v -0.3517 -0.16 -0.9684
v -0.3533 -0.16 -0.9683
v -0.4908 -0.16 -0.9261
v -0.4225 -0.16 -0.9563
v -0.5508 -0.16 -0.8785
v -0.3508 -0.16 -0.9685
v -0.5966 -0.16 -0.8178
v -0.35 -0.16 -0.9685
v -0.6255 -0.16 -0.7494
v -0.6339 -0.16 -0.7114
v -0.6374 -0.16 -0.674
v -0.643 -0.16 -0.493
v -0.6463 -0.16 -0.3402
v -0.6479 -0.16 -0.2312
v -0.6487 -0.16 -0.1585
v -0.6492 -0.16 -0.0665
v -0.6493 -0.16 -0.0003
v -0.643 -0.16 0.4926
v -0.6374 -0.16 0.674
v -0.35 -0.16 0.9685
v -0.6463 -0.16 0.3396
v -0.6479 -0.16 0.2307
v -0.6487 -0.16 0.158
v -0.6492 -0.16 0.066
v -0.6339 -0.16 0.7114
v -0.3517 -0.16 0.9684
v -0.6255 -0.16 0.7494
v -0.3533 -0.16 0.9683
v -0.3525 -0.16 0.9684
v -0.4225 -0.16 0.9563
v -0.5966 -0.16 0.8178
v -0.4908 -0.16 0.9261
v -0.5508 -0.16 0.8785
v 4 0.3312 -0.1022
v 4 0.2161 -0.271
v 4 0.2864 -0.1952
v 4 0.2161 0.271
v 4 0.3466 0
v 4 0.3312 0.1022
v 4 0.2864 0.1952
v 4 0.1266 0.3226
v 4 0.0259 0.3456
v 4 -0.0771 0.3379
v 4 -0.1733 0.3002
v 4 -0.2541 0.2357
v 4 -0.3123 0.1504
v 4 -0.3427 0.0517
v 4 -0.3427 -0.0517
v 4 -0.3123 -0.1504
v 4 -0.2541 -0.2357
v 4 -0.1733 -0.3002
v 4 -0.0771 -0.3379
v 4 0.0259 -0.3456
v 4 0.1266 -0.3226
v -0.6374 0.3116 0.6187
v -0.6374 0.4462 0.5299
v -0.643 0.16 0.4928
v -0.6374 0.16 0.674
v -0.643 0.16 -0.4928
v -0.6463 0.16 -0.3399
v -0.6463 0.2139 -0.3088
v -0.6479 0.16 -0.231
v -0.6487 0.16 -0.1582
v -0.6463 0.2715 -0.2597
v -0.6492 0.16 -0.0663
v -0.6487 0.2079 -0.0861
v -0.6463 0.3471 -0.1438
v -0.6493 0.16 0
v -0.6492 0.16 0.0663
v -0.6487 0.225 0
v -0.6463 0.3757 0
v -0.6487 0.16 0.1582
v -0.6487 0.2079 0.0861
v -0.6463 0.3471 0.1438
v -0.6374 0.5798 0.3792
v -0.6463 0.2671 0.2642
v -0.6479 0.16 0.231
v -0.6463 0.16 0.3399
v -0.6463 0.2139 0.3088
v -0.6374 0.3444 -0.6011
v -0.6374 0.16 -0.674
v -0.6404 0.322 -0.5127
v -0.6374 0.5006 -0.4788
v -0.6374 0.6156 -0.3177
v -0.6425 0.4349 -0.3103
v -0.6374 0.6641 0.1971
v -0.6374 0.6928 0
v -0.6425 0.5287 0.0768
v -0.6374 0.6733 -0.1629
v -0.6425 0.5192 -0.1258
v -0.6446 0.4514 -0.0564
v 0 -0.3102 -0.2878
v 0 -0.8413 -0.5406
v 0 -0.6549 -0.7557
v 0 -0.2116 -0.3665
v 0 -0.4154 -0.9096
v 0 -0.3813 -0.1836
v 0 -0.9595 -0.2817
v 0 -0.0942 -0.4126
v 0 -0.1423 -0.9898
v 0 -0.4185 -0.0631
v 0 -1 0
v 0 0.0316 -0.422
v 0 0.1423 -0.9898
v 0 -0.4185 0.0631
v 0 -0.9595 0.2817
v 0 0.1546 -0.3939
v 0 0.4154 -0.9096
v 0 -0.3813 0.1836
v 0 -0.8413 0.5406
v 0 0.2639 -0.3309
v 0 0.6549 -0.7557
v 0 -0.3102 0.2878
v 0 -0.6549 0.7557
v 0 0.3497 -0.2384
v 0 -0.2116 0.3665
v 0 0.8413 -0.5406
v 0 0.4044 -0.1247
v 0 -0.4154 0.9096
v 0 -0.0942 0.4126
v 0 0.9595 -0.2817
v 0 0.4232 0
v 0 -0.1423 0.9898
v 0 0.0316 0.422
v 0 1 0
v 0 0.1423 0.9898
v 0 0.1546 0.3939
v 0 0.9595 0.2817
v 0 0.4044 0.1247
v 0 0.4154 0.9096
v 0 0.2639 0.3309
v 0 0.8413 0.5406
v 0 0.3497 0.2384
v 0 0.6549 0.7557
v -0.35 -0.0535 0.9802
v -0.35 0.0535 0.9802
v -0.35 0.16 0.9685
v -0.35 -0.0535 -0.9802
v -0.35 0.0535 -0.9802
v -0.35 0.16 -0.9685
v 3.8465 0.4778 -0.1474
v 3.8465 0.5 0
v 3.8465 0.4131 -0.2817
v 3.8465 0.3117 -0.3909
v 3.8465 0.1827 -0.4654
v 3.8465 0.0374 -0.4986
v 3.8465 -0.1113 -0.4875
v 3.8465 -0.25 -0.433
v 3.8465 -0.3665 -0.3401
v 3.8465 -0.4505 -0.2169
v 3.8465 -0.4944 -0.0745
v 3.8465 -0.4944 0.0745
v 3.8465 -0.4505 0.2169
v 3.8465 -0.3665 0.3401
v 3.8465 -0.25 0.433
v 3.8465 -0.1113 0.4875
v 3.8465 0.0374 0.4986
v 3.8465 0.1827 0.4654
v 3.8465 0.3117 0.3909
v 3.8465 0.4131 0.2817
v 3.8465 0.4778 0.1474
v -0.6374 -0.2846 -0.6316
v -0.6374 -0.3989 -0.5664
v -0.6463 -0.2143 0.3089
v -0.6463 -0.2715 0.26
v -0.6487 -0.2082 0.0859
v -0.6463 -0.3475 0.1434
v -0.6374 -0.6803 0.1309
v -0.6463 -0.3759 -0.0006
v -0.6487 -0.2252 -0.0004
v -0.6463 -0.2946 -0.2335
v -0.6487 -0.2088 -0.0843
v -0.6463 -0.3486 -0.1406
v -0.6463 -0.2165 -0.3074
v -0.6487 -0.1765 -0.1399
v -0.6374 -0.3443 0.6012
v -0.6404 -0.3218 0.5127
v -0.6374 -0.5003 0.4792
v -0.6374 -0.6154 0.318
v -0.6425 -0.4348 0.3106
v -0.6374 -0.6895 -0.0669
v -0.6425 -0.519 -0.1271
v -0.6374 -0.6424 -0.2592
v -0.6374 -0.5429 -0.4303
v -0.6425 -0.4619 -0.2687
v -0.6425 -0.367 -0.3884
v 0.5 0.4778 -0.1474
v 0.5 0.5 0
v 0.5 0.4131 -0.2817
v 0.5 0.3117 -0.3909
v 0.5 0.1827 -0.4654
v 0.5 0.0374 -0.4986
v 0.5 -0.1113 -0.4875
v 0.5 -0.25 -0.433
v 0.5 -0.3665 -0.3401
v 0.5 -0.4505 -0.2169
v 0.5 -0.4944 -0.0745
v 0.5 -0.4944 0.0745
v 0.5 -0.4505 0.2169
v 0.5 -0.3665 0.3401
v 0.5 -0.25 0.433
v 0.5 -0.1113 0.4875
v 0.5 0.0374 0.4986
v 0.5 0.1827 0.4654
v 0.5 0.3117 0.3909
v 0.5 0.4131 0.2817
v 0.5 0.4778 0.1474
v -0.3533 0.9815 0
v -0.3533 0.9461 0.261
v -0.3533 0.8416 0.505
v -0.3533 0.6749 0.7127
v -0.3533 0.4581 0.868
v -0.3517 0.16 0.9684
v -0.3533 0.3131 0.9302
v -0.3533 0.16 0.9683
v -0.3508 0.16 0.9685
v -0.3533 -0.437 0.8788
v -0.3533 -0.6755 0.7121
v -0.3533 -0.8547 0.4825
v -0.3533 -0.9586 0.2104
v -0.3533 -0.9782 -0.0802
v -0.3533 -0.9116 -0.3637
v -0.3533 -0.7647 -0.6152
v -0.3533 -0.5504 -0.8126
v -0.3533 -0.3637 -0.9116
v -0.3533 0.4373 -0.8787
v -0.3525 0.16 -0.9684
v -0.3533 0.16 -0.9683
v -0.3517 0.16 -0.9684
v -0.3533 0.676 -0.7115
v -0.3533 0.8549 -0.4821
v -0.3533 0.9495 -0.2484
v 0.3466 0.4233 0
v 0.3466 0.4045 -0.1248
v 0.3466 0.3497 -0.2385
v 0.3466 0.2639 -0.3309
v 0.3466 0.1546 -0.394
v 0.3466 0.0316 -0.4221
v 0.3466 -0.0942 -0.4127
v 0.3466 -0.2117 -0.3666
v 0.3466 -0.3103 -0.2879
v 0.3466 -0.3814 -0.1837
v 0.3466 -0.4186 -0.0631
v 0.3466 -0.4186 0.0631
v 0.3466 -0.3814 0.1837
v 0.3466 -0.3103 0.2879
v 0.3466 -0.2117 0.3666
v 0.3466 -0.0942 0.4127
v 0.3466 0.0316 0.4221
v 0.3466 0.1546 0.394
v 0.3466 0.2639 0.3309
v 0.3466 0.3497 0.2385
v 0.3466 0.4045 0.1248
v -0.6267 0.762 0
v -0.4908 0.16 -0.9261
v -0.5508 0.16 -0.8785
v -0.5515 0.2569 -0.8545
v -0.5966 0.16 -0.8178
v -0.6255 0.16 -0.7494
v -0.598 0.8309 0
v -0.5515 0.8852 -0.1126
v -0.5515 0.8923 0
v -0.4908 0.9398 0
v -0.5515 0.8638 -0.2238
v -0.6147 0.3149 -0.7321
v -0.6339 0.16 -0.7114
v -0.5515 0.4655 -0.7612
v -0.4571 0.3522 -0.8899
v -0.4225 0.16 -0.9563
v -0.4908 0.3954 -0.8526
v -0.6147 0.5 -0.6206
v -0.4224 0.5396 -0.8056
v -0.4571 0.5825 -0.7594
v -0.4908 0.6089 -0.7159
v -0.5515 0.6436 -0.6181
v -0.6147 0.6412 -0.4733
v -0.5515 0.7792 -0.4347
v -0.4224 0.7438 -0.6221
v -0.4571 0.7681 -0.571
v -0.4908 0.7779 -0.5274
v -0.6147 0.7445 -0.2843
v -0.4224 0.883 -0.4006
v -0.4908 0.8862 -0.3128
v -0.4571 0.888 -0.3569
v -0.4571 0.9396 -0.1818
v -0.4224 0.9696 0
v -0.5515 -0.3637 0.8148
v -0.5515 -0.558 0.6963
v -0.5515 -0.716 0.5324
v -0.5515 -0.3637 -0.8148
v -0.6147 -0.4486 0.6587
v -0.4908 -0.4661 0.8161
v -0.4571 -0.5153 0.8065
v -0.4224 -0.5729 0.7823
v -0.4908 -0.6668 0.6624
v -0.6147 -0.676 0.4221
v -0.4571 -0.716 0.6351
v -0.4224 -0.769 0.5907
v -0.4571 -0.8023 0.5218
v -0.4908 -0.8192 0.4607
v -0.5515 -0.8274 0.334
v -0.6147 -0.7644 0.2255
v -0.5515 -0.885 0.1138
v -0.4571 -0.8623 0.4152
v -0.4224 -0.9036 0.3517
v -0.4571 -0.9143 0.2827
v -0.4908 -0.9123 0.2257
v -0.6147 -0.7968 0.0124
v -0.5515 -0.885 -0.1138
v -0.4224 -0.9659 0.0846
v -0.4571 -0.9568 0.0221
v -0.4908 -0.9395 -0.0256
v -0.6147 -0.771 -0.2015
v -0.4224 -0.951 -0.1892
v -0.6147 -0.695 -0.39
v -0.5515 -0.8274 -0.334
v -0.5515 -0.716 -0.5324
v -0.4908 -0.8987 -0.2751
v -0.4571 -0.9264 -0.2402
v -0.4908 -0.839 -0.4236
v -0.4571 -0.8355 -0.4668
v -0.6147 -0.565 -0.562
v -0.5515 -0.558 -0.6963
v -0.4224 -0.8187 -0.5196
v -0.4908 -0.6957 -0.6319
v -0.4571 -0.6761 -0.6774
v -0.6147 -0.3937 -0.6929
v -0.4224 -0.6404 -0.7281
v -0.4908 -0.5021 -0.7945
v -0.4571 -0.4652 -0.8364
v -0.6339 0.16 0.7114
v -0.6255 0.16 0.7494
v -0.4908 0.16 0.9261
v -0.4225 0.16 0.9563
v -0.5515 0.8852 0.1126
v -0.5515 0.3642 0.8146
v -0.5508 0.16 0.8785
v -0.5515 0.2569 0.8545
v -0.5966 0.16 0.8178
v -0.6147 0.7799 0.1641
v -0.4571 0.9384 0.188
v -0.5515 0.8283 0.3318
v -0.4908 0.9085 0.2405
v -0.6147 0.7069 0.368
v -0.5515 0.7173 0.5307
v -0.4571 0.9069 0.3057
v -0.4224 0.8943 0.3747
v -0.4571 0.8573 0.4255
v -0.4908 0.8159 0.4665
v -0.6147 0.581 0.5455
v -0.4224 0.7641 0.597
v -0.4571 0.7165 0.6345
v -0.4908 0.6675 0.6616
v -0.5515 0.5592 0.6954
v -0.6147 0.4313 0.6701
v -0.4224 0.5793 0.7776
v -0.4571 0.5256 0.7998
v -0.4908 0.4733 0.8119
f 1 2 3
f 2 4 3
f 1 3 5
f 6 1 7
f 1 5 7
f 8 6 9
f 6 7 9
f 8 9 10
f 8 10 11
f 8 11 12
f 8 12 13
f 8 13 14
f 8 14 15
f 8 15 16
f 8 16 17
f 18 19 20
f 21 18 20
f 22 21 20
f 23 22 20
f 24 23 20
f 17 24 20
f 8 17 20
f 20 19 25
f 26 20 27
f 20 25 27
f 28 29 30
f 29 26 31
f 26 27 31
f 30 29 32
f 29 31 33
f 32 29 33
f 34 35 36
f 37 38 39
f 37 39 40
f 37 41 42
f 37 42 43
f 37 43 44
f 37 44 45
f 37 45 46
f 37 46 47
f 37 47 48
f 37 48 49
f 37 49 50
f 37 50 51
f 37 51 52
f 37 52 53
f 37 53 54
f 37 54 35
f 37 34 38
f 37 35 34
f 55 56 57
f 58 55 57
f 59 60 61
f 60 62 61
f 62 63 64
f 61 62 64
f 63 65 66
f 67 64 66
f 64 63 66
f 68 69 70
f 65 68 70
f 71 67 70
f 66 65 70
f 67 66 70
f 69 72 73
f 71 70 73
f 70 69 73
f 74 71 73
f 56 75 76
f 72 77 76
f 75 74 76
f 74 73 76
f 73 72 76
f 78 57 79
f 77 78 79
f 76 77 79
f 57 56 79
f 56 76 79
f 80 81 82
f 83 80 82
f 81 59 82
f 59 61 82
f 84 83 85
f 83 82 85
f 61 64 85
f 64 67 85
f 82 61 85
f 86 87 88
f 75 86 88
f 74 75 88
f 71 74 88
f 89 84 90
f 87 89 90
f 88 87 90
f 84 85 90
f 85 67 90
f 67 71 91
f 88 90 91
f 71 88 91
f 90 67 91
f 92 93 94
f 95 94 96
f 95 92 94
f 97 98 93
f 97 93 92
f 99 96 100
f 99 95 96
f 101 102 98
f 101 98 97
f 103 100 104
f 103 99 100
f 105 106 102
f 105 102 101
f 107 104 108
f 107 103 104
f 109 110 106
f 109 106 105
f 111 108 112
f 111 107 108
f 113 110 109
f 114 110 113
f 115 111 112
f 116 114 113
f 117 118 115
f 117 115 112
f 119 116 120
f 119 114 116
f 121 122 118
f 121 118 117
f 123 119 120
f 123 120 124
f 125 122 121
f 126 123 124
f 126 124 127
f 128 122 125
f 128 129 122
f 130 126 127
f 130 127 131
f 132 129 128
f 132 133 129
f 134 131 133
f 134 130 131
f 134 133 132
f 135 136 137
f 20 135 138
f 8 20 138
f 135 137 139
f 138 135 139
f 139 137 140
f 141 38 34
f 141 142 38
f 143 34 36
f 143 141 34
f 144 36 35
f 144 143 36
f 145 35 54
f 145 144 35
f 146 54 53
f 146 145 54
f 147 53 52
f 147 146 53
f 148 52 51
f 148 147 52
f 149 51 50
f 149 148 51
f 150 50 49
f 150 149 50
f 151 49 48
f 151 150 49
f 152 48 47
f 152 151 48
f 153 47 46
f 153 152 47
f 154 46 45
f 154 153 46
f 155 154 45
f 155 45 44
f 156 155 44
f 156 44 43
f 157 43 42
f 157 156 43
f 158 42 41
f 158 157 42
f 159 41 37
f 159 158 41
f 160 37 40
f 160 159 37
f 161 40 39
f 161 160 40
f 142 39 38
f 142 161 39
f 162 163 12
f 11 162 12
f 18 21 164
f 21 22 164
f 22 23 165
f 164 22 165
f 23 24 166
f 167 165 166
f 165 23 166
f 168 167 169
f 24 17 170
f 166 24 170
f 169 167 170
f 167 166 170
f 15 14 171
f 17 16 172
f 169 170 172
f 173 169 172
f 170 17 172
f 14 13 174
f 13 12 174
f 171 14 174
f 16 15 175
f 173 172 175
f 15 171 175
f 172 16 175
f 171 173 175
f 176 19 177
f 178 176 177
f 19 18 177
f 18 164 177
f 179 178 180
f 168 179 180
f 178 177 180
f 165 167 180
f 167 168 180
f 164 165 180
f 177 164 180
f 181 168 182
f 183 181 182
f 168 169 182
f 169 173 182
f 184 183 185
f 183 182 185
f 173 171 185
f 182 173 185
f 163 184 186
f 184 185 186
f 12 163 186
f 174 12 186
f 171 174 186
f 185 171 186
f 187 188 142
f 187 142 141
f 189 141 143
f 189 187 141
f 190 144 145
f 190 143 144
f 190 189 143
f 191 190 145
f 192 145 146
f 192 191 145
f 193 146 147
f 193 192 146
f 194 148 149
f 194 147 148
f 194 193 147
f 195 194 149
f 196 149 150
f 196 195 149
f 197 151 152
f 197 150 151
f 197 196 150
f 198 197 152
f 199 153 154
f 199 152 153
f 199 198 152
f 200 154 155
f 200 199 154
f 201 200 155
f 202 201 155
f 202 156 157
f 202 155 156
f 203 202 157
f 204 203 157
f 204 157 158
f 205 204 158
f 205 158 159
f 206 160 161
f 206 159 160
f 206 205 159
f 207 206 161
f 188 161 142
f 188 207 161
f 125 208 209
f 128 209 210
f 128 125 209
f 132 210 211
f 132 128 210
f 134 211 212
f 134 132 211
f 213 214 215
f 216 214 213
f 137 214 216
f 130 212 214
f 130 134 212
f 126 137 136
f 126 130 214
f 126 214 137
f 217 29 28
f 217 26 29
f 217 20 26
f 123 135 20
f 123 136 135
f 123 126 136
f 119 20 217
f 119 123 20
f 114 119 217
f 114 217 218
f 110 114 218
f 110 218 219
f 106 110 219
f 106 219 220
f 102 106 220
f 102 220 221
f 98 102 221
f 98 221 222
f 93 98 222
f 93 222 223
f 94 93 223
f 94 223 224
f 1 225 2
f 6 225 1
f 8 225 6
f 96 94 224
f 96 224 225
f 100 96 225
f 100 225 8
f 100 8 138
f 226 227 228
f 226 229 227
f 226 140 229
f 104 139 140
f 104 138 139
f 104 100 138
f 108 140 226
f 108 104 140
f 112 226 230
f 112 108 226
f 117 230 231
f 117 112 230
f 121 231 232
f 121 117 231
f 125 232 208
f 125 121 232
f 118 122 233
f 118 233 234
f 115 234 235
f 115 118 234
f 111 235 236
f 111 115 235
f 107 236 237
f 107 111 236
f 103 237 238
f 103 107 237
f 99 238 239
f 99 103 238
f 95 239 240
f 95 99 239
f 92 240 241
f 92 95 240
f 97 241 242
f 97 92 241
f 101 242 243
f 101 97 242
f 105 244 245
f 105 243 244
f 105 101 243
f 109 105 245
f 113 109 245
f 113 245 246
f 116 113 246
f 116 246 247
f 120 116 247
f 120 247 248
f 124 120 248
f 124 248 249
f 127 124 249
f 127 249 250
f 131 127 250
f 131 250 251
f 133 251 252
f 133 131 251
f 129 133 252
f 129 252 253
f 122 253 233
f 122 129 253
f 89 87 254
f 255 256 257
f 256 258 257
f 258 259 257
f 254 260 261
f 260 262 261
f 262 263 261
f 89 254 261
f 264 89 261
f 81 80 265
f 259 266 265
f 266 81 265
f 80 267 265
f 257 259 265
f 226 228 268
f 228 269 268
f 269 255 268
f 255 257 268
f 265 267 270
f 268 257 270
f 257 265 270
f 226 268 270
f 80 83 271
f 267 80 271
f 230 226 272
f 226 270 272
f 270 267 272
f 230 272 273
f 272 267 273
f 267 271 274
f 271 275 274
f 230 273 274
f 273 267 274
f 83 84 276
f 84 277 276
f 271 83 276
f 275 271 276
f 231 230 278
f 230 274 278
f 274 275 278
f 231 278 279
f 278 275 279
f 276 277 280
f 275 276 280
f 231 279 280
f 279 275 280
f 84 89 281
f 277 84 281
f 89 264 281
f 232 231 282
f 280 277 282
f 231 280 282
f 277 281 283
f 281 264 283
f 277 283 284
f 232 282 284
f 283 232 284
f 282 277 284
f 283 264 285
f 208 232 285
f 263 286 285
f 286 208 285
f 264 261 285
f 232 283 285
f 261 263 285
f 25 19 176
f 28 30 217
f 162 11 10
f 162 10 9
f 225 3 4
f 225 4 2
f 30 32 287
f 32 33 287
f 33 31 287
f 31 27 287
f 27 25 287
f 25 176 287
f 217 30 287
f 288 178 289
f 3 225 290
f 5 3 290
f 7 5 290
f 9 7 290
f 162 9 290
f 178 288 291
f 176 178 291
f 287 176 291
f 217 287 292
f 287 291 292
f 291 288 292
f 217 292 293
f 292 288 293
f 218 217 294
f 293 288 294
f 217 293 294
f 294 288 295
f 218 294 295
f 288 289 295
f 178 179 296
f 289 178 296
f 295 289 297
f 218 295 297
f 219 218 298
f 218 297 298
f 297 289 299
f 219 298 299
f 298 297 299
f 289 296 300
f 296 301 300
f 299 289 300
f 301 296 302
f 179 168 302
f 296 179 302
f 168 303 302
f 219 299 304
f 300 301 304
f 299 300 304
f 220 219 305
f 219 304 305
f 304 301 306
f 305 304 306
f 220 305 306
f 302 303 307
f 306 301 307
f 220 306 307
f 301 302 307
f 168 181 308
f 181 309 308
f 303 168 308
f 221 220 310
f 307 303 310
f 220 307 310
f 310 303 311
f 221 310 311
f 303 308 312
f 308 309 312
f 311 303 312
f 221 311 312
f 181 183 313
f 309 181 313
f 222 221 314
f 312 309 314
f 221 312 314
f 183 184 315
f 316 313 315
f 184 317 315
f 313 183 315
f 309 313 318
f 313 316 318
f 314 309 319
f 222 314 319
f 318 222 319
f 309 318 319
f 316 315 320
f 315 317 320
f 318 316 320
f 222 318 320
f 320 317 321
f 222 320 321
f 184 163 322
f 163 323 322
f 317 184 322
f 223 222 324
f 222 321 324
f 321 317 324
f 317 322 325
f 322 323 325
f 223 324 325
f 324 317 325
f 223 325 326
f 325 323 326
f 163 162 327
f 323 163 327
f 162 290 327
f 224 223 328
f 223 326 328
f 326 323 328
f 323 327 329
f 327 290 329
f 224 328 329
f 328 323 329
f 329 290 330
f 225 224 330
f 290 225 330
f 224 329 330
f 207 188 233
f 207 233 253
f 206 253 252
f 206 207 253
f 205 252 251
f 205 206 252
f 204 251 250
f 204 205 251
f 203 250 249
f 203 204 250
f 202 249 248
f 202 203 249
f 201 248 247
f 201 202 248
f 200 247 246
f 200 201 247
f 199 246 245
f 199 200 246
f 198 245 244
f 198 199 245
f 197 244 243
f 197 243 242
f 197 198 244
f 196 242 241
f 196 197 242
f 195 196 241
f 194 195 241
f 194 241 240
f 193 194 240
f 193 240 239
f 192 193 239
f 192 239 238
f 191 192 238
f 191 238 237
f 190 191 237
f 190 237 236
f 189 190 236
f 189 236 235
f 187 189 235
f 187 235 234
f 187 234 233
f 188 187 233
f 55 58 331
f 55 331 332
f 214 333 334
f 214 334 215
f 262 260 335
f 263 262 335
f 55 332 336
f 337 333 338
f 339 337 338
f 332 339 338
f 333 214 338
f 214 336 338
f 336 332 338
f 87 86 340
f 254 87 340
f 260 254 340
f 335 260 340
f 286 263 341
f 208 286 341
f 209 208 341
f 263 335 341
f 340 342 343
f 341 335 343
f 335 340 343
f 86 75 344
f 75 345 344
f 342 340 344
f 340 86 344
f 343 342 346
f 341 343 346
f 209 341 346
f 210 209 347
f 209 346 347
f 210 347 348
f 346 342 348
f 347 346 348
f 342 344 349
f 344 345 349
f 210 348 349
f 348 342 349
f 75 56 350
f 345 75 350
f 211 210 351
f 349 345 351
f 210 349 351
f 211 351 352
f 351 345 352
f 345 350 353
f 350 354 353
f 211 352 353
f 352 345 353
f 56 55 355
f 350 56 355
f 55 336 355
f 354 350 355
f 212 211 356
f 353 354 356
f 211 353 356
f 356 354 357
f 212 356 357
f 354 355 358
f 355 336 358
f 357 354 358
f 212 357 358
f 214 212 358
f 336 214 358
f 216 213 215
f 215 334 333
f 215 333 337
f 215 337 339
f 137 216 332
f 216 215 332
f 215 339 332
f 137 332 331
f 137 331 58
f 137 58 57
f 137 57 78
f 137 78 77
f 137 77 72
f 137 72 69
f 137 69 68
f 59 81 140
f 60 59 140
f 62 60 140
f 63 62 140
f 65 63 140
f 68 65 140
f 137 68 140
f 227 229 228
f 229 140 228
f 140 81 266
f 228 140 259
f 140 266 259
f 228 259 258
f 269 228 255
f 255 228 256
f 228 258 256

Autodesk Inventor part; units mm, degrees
ref_plane "YZ Plane" through (0, 0, 0) normal (1, 0, 0) x (0, 1, 0)
sketch "Sketch1" plane through (0, 0, 0) normal (0, 0, 1) x (1, 0, 0)
  line L0 (-0.65, 0) -> (4, 0)
  line L1 (4, 0) -> (4, 0.5)
  line L2 (4, 0.5) -> (0.5, 0.5)
  line L3 (0.5, 0.5) -> (0.3466, 0.4233)
  line L4 (0.3466, 0.4233) -> (0, 0.4232)
  line L5 (0, 0.4232) -> (0, 1)
  line L6 (-4.4792, 0) -> (22.2824, 0) projected
  line L7 (0, -0.2) -> (0, 1.2) projected
  line L8 (0, 1) -> (-0.6255, 0.9672)
  arc A0 (-0.6255, 0.9672) -> (-0.65, 0) centre (18.4593, 0) ccw
  dimension "d0" = 4
  dimension "d1" = 3.5
  dimension "d2" = 0.1534
  dimension "d3" = 0.65
  dimension "d4" = 1
  dimension "d5" = 0.8465
  dimension "d9" = 2
  dimension "d10" = 3
  dimension "d15" = 19.1093
revolve "Body" add sketch "Sketch1" angle 360 about axis through (-0.65, 0, 0) along (1, 0, 0)
fillet "Fillet1" radius 0.3 1 edges at (-0.6255, -0.9672, 0)
ref_plane "IDS_WORKPLANE{1}" through (-0.65, 0, 0) normal (1, 0, 0) x (0, 0, -1)
sketch "Sketch2" plane through (-0.65, 0, 0) normal (1, 0, 0) x (0, 0, -1)
  line L0 (0, -1.4) -> (0, 1.4) projected
  line L1 (1.4, 0) -> (-1.4, 0) projected
  line L2 (-1, 0.16) -> (1, 0.16)
  line L3 (1, 0.16) -> (1, -0.16)
  line L4 (1, -0.16) -> (-1, -0.16)
  line L5 (-1, -0.16) -> (-1, 0.16)
  line L6 (0, 0.16) -> (0, -0.16) construction
  line L7 (-1, 0) -> (1, 0) construction
  circle A0 centre (0, 0) radius 1 projected
  dimension "d17" = 0.32
extrude "Slot" cut sketch "Sketch2" along normal blind 0.3 contours L4 A0 L1 L0 | L0 L1 A0 L4 | L4 L5 A0 | A0 L3 L4 | L1 A0 L2 L0 | L0 L2 A0 L1 | L5 L2 A0 | A0 L2 L3
thread "Thread" size "M1x0.25" class "6g" standard "ISO Metric profile" length 3.5
chamfer "Chamfer1" distance 0.1534 distance2 0.1535 1 edges at (4, -0.5, 0) measured on face at (4, -0.1476, -0.0775)
ref_plane "Work Plane2" through (8.25, 0, 0) normal (0, 0, -1) x (1, 0, 0)
equation "\"d17\" = SBR"
equation "\"d18\" = STI"
equation "\"d20\" = RR"
equation "\"d11\" = GEL"
equation "\"d13\" = -0.5 * SPD + 0.5 * GD"
equation "\"d0\" = NLG"
equation "\"d1\" = GEL"
equation "\"d2\" = GAL"
equation "\"d3\" = KOH"
equation "\"d4\" = GD"
equation "\"d5\" = BDM"
equation "\"d9\" = KOD"
equation "\"d10\" = KEWI"
equation "\"GD\" = NND"
equation "\"NLG\" = 4"
equation "\"GEL\" = 3.5"
equation "\"KOD\" = 2"
equation "\"KOH\" = 0.65"
equation "\"GAL\" = 0.61345 * PTC"
equation "\"SPD\" = NND - 1.2269 * PTC"
equation "\"BDM\" = 0.8465"
equation "\"GUL\" = 0.61345 * PTC"
equation "\"RR\" = 0.3"
equation "\"SBR\" = 0.32"
equation "\"STI\" = 0.3"
equation "\"KEWI\" = 3deg"
equation "\"KR\" = 3"
equation "\"d16\" = -KOH"
equation "\"PTC\" = 0.25"
equation "\"THREADDIA\" = 1"
equation "\"TOA\" = 30deg"
equation "\"NND\" = 1"
equation "\"GD1\" = THREADDIA - 1.2269 * PTC"
properties part number "KS B 1021 - M 1 x 4" material "Steel, Mild"
